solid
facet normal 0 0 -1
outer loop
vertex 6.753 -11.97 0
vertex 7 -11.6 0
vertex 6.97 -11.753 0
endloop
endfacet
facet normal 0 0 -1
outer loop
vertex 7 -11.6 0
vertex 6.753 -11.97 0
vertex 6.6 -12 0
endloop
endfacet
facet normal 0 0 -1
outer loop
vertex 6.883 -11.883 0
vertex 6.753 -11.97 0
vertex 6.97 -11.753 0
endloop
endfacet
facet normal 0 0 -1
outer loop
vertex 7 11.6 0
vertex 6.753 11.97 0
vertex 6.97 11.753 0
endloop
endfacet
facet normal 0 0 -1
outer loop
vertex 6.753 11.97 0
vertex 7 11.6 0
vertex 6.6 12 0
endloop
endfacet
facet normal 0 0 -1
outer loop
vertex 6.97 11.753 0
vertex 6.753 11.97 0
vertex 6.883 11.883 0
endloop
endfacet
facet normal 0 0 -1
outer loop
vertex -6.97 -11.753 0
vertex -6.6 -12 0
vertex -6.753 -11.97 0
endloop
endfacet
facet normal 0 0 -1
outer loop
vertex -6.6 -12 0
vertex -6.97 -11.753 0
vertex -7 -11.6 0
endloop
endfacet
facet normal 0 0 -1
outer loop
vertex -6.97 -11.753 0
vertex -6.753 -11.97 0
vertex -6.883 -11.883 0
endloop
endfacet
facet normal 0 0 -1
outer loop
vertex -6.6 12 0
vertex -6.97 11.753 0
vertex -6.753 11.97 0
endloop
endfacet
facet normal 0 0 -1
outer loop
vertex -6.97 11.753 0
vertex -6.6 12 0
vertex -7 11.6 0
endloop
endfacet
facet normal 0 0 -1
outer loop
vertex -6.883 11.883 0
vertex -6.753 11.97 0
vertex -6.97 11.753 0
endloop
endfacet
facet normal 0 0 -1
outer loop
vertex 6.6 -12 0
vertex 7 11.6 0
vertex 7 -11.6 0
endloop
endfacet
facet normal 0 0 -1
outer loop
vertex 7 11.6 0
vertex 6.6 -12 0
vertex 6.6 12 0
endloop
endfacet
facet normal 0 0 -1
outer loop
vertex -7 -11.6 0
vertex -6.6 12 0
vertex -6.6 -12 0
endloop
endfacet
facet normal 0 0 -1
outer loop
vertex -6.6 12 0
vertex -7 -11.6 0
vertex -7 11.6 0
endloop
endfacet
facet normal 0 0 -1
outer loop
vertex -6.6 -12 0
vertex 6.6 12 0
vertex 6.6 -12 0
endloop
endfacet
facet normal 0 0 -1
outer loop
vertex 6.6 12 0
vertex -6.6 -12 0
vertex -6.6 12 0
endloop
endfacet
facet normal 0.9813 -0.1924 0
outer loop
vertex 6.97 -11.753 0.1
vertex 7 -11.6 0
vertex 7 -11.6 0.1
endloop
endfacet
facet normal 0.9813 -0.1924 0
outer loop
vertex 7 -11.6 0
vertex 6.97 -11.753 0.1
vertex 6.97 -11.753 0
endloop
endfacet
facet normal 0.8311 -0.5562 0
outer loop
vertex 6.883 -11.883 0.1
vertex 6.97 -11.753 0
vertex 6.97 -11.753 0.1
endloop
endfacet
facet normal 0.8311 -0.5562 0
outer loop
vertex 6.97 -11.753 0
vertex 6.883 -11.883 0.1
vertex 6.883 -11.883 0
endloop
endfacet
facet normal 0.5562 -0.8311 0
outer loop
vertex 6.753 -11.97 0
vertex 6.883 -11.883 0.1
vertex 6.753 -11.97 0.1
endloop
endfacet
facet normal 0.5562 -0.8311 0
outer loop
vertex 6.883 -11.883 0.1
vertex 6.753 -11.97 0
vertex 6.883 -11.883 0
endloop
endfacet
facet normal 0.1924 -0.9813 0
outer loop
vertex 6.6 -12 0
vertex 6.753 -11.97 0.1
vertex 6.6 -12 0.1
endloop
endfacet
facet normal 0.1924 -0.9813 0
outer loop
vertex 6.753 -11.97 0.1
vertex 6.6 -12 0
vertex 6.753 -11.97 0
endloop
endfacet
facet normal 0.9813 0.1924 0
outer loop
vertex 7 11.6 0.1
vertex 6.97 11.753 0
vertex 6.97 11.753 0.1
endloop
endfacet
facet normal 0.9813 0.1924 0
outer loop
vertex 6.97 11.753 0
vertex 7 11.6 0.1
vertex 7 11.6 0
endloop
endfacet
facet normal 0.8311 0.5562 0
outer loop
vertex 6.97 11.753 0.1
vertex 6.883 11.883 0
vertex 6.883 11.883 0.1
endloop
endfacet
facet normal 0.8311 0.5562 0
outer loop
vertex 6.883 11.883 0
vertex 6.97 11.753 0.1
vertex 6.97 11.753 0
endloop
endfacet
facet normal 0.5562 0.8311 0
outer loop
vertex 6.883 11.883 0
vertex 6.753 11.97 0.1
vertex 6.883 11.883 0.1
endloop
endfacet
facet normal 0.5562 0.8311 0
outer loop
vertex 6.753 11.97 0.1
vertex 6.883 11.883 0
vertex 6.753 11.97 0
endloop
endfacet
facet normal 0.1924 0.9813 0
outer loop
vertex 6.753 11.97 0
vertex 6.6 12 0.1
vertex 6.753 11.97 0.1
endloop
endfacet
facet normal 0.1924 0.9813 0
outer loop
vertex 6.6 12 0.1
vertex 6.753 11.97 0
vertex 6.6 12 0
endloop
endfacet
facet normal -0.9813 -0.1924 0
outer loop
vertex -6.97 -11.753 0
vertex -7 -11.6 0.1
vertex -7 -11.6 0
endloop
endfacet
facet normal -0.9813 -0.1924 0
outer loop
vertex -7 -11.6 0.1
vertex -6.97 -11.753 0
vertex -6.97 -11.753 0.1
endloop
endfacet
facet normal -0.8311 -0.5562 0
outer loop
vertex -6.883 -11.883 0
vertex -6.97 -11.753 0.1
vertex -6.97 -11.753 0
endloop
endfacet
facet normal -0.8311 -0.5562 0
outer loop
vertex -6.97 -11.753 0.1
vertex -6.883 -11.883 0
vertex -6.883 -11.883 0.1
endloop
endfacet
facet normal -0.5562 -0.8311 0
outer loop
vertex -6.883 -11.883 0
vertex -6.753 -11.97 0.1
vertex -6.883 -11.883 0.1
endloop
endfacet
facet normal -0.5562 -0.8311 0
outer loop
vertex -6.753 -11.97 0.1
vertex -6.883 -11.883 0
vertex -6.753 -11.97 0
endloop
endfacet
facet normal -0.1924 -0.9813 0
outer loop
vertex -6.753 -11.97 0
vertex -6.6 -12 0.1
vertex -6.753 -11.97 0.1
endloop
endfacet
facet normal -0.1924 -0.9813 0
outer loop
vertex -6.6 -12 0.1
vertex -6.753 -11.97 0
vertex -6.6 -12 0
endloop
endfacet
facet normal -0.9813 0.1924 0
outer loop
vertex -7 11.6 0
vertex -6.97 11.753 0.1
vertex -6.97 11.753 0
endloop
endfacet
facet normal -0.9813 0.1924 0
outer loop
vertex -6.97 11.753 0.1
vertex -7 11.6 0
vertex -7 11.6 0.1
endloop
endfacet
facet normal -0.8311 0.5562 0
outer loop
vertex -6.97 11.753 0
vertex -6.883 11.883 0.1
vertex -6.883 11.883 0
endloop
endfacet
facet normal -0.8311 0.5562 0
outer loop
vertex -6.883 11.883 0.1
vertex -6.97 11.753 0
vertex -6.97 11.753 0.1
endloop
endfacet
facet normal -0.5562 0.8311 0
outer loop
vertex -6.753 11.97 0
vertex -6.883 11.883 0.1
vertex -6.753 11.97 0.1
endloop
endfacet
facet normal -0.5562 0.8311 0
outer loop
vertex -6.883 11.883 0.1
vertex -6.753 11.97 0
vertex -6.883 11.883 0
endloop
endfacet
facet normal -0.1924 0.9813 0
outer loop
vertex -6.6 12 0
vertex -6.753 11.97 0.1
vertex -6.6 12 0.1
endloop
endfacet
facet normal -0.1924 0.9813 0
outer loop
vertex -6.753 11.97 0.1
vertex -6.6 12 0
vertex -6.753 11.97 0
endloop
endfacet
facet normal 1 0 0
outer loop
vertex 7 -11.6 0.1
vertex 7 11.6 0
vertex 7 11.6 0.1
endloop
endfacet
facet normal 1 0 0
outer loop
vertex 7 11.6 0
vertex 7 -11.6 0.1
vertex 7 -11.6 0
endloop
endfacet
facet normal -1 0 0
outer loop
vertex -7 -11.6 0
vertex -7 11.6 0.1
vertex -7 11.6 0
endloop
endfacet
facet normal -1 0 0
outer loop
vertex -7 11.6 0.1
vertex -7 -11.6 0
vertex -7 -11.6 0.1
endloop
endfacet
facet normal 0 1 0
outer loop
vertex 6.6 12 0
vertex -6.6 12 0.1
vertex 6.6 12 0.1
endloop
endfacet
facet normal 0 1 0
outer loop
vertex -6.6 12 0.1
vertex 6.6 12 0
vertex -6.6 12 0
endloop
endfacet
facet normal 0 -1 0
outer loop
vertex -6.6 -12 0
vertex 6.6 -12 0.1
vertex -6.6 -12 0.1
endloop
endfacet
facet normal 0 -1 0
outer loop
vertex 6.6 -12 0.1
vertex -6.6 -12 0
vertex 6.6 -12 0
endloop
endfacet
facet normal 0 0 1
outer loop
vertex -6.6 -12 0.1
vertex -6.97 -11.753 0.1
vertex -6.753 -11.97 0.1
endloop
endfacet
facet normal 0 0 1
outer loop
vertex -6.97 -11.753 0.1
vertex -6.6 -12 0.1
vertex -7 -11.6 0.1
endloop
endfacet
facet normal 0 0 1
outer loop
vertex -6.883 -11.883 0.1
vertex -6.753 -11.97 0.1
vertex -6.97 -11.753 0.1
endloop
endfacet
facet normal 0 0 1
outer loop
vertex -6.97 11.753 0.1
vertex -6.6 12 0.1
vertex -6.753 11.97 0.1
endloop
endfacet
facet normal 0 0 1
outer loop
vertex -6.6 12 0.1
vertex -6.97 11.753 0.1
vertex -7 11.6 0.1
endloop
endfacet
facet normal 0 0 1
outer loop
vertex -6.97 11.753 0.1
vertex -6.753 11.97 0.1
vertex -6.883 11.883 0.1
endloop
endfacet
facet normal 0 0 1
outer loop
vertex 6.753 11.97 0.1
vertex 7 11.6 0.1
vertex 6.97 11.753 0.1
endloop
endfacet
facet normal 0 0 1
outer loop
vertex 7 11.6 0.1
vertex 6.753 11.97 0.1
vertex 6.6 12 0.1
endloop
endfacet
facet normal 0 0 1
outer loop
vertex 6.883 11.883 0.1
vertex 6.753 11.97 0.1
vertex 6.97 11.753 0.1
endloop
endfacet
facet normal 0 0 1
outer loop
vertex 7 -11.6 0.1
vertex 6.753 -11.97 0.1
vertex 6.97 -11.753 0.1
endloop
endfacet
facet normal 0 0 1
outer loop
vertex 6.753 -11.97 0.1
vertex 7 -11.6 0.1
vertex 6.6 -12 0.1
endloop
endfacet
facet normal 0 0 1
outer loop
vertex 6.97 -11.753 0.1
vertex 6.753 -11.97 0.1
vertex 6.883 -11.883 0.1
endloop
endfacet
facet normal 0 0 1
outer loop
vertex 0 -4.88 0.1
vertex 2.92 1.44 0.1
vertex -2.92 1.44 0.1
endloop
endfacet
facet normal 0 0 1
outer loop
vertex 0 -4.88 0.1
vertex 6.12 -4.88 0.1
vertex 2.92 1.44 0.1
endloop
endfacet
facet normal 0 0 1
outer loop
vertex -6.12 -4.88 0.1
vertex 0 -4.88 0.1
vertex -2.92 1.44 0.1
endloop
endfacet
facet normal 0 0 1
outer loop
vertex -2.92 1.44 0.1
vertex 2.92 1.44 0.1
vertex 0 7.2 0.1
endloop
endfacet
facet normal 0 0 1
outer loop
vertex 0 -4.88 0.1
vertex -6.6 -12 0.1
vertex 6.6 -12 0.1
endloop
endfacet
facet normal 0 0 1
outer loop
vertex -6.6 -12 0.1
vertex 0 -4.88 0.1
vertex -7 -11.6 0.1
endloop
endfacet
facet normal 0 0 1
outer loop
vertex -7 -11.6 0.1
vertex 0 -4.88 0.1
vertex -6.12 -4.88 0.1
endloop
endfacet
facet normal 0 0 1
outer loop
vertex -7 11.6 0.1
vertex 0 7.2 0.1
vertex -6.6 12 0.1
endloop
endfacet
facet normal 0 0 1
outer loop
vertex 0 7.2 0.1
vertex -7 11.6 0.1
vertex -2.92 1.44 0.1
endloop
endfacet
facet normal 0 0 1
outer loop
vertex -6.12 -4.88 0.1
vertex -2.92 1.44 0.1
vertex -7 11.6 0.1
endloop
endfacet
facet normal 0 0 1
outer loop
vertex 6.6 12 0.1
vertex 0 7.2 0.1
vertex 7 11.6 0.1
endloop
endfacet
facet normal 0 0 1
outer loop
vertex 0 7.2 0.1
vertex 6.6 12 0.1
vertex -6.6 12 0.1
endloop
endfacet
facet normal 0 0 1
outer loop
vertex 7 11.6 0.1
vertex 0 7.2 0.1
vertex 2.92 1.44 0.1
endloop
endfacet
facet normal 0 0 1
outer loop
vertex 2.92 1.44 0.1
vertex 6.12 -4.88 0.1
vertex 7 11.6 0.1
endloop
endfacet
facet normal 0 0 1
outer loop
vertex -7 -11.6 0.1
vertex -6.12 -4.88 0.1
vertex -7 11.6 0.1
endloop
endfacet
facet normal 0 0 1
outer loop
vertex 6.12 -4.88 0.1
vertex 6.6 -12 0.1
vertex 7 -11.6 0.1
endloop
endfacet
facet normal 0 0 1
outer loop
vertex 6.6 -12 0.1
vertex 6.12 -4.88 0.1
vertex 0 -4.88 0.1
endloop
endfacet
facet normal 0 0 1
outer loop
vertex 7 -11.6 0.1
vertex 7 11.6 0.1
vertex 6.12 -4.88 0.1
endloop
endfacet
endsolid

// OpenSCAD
// file: ../p/1-4cyli.scad
use <../lib.scad>
function ldraw_lib__1_4cyli() = [
// 0 Cylinder 0.25
// 0 Name: 1-4cyli.dat
// 0 Author: James Jessiman
// 0 !LDRAW_ORG Primitive UPDATE 2012-01
// 0 !LICENSE Licensed under CC BY 4.0 : see CAreadme.txt
// 
// 0 BFC CERTIFY CCW
  [0,"BFC","CERTIFY"],
  [0,"BFC","CCW"],
// 
// 0 !HISTORY 2002-03-23 [sbliss] Added BFC statement.
// 0 !HISTORY 2002-04-25 [PTadmin] Official Update 2002-02
// 0 !HISTORY 2007-06-22 [PTadmin] Header formatted for Contributor Agreement
// 0 !HISTORY 2008-07-01 [PTadmin] Official Update 2008-01
// 0 !HISTORY 2012-02-16 [Philo] Changed to CCW
// 0 !HISTORY 2012-03-30 [PTadmin] Official Update 2012-01
// 
// 
// 4 16 1 1 0 0.9239 1 0.3827 0.9239 0 0.3827 1 0 0
  [4,16,1,1,0,0.9239,1,0.3827,0.9239,0,0.3827,1,0,0],
// 5 24 1 0 0 1 1 0 0.9239 0 0.3827 1 0 -1
  [5,24,1,0,0,1,1,0,0.9239,0,0.3827,1,0,-1],
// 4 16 0.9239 1 0.3827 0.7071 1 0.7071 0.7071 0 0.7071 0.9239 0 0.3827
  [4,16,0.9239,1,0.3827,0.7071,1,0.7071,0.7071,0,0.7071,0.9239,0,0.3827],
// 5 24 0.9239 0 0.3827 0.9239 1 0.3827 0.7071 0 0.7071 1 0 0
  [5,24,0.9239,0,0.3827,0.9239,1,0.3827,0.7071,0,0.7071,1,0,0],
// 4 16 0.7071 1 0.7071 0.3827 1 0.9239 0.3827 0 0.9239 0.7071 0 0.7071
  [4,16,0.7071,1,0.7071,0.3827,1,0.9239,0.3827,0,0.9239,0.7071,0,0.7071],
// 5 24 0.7071 0 0.7071 0.7071 1 0.7071 0.3827 0 0.9239 0.9239 0 0.3827
  [5,24,0.7071,0,0.7071,0.7071,1,0.7071,0.3827,0,0.9239,0.9239,0,0.3827],
// 4 16 0.3827 1 0.9239 0 1 1 0 0 1 0.3827 0 0.9239
  [4,16,0.3827,1,0.9239,0,1,1,0,0,1,0.3827,0,0.9239],
// 5 24 0.3827 0 0.9239 0.3827 1 0.9239 0 0 1 0.7071 0 0.7071
  [5,24,0.3827,0,0.9239,0.3827,1,0.9239,0,0,1,0.7071,0,0.7071],
// 5 24 0 0 1 0 1 1 0.3827 0 0.9239 -1 0 1
  [5,24,0,0,1,0,1,1,0.3827,0,0.9239,-1,0,1],
];
module ldraw_lib__1_4cyli(step=0, col=false, unit=2/5, alt=false, line=0.2, solid=!$preview)
    makepoly(ldraw_lib__1_4cyli(), step=step, col=col, unit=unit, alt=alt, line=line, solid=solid);
ldraw_lib__1_4cyli(line=0.2);
// file: ../p/1-4chrd.scad
use <../lib.scad>
function ldraw_lib__1_4chrd() = [
// 0 Chord 0.25
// 0 Name: 1-4chrd.dat
// 0 Author: Max Martin Richter [MMR1988]
// 0 !LDRAW_ORG Primitive UPDATE 2023-05
// 0 !LICENSE Licensed under CC BY 4.0 : see CAreadme.txt
// 
// 0 BFC CERTIFY CCW
  [0,"BFC","CERTIFY"],
  [0,"BFC","CCW"],
// 
// 0 !HISTORY 2004-04-22 [PTadmin] Official Update 2004-02
// 0 !HISTORY 2007-10-09 [PTadmin] Header formatted for Contributor Agreement
// 0 !HISTORY 2008-07-01 [PTadmin] Official Update 2008-01
// 0 !HISTORY 2012-08-02 [MMR1988] Re-creation with PrimGen2 and Rectifier
// 0 !HISTORY 2012-08-09 [PTadmin] Official Update 2012-02
// 0 !HISTORY 2023-10-27 [OrionP] Change author to MMR1988 from hafhead
// 0 !HISTORY 2023-10-31 [OrionP] Official Update 2023-05
// 
// 4 16 0.9239 0 0.3827 0.3827 0 0.9239 0 0 1 1 0 0
  [4,16,0.9239,0,0.3827,0.3827,0,0.9239,0,0,1,1,0,0],
// 3 16 0.7071 0 0.7071 0.3827 0 0.9239 0.9239 0 0.3827
  [3,16,0.7071,0,0.7071,0.3827,0,0.9239,0.9239,0,0.3827],
];
module ldraw_lib__1_4chrd(step=0, col=false, unit=2/5, alt=false, line=0.2, solid=!$preview)
    makepoly(ldraw_lib__1_4chrd(), step=step, col=col, unit=unit, alt=alt, line=line, solid=solid);
ldraw_lib__1_4chrd(line=0.2);
// main file
use <../lib.scad>
use <../p/1-4chrd.scad>
use <../p/1-4cyli.scad>
function ldraw_lib__6429457e() = [
// 0 Sticker  1.8 x  3.0 with Blacktron I Logo
// 0 Name: 6429457e.dat
// 0 Author: Gabriel Läufer [Dr.Bricktacular]
// 0 !LDRAW_ORG Part UPDATE 2025-02
// 0 !LICENSE Licensed under CC BY 4.0 : see CAreadme.txt
// 
// 0 BFC CERTIFY CCW
  [0,"BFC","CERTIFY"],
  [0,"BFC","CCW"],
// 
// 0 !KEYWORDS Blacktron Cruiser, Bricklink 40580stk01, Brickowl 402277
// 0 !KEYWORDS Rebrickable 10102362, Set 40580
// 
// 0 !HISTORY 2025-02-27 [OrionP] Official Update 2025-02
// 
// 0 // Sticker-Bottom
// 1 16 16.5 0 -29.0 1 0 0 0 -1 0 0 0 -1 1-4chrd.dat
  [1,16,16.5,0,-29.0,1,0,0,0,-1,0,0,0,-1, ldraw_lib__1_4chrd()],
// 1 16 16.5 0 29.0 1 0 0 0 -1 0 0 0 1 1-4chrd.dat
  [1,16,16.5,0,29.0,1,0,0,0,-1,0,0,0,1, ldraw_lib__1_4chrd()],
// 1 16 -16.5 0 -29.0 -1 0 0 0 -1 0 0 0 -1 1-4chrd.dat
  [1,16,-16.5,0,-29.0,-1,0,0,0,-1,0,0,0,-1, ldraw_lib__1_4chrd()],
// 1 16 -16.5 0 29.0 -1 0 0 0 -1 0 0 0 1 1-4chrd.dat
  [1,16,-16.5,0,29.0,-1,0,0,0,-1,0,0,0,1, ldraw_lib__1_4chrd()],
// 4 16 17.5 0 29.0 17.5 0 -29.0 16.5 0 -30.0 16.5 0 30.0
  [4,16,17.5,0,29.0,17.5,0,-29.0,16.5,0,-30.0,16.5,0,30.0],
// 4 16 -17.5 0 29.0 -16.5 0 30.0 -16.5 0 -30.0 -17.5 0 -29.0
  [4,16,-17.5,0,29.0,-16.5,0,30.0,-16.5,0,-30.0,-17.5,0,-29.0],
// 4 16 16.5 0 30.0 16.5 0 -30.0 -16.5 0 -30.0 -16.5 0 30.0
  [4,16,16.5,0,30.0,16.5,0,-30.0,-16.5,0,-30.0,-16.5,0,30.0],
// 
// 0 // Sticker-Side
// 1 16 16.5 -0.25 -29.0 1 0 0 0 0.25 0 0 0 -1 1-4cyli.dat
  [1,16,16.5,-0.25,-29.0,1,0,0,0,0.25,0,0,0,-1, ldraw_lib__1_4cyli()],
// 1 16 16.5 -0.25 29.0 1 0 0 0 0.25 0 0 0 1 1-4cyli.dat
  [1,16,16.5,-0.25,29.0,1,0,0,0,0.25,0,0,0,1, ldraw_lib__1_4cyli()],
// 1 16 -16.5 -0.25 -29.0 -1 0 0 0 0.25 0 0 0 -1 1-4cyli.dat
  [1,16,-16.5,-0.25,-29.0,-1,0,0,0,0.25,0,0,0,-1, ldraw_lib__1_4cyli()],
// 1 16 -16.5 -0.25 29.0 -1 0 0 0 0.25 0 0 0 1 1-4cyli.dat
  [1,16,-16.5,-0.25,29.0,-1,0,0,0,0.25,0,0,0,1, ldraw_lib__1_4cyli()],
// 4 16 17.5 0 29.0 17.5 -0.25 29.0 17.5 -0.25 -29.0 17.5 0 -29.0
  [4,16,17.5,0,29.0,17.5,-0.25,29.0,17.5,-0.25,-29.0,17.5,0,-29.0],
// 4 16 -17.5 0 29.0 -17.5 0 -29.0 -17.5 -0.25 -29.0 -17.5 -0.25 29.0
  [4,16,-17.5,0,29.0,-17.5,0,-29.0,-17.5,-0.25,-29.0,-17.5,-0.25,29.0],
// 4 16 -16.5 0 30.0 -16.5 -0.25 30.0 16.5 -0.25 30.0 16.5 0 30.0
  [4,16,-16.5,0,30.0,-16.5,-0.25,30.0,16.5,-0.25,30.0,16.5,0,30.0],
// 4 16 -16.5 0 -30.0 16.5 0 -30.0 16.5 -0.25 -30.0 -16.5 -0.25 -30.0
  [4,16,-16.5,0,-30.0,16.5,0,-30.0,16.5,-0.25,-30.0,-16.5,-0.25,-30.0],
// 
// 0 // Sticker-Front
// 1 0 -16.5 -.25 -29 -1 0 0 0 1 0 0 0 -1 1-4chrd.dat
  [1,0,-16.5,-.25,-29,-1,0,0,0,1,0,0,0,-1, ldraw_lib__1_4chrd()],
// 1 0 -16.5 -.25 29 -1 0 0 0 1 0 0 0 1 1-4chrd.dat
  [1,0,-16.5,-.25,29,-1,0,0,0,1,0,0,0,1, ldraw_lib__1_4chrd()],
// 1 0 16.5 -.25 29 1 0 0 0 1 0 0 0 1 1-4chrd.dat
  [1,0,16.5,-.25,29,1,0,0,0,1,0,0,0,1, ldraw_lib__1_4chrd()],
// 1 0 16.5 -.25 -29 1 0 0 0 1 0 0 0 -1 1-4chrd.dat
  [1,0,16.5,-.25,-29,1,0,0,0,1,0,0,0,-1, ldraw_lib__1_4chrd()],
// 3 0 0 -.25 -12.2 7.3 -.25 3.6 -7.3 -.25 3.6
  [3,0,0,-.25,-12.2,7.3,-.25,3.6,-7.3,-.25,3.6],
// 3 14 0 -.25 -12.2 15.3 -.25 -12.2 7.3 -.25 3.6
  [3,14,0,-.25,-12.2,15.3,-.25,-12.2,7.3,-.25,3.6],
// 3 14 -15.3 -.25 -12.2 0 -.25 -12.2 -7.3 -.25 3.6
  [3,14,-15.3,-.25,-12.2,0,-.25,-12.2,-7.3,-.25,3.6],
// 3 14 -7.3 -.25 3.6 7.3 -.25 3.6 0 -.25 18
  [3,14,-7.3,-.25,3.6,7.3,-.25,3.6,0,-.25,18],
// 4 0 -16.5 -.25 -30 16.5 -.25 -30 0 -.25 -12.2 -17.5 -.25 -29
  [4,0,-16.5,-.25,-30,16.5,-.25,-30,0,-.25,-12.2,-17.5,-.25,-29],
// 3 0 -17.5 -.25 -29 0 -.25 -12.2 -15.3 -.25 -12.2
  [3,0,-17.5,-.25,-29,0,-.25,-12.2,-15.3,-.25,-12.2],
// 4 0 0 -.25 18 -16.5 -.25 30 -17.5 -.25 29 -7.3 -.25 3.6
  [4,0,0,-.25,18,-16.5,-.25,30,-17.5,-.25,29,-7.3,-.25,3.6],
// 3 0 -15.3 -.25 -12.2 -7.3 -.25 3.6 -17.5 -.25 29
  [3,0,-15.3,-.25,-12.2,-7.3,-.25,3.6,-17.5,-.25,29],
// 4 0 16.5 -.25 30 -16.5 -.25 30 0 -.25 18 17.5 -.25 29
  [4,0,16.5,-.25,30,-16.5,-.25,30,0,-.25,18,17.5,-.25,29],
// 3 0 17.5 -.25 29 0 -.25 18 7.3 -.25 3.6
  [3,0,17.5,-.25,29,0,-.25,18,7.3,-.25,3.6],
// 3 0 7.3 -.25 3.6 15.3 -.25 -12.2 17.5 -.25 29
  [3,0,7.3,-.25,3.6,15.3,-.25,-12.2,17.5,-.25,29],
// 3 0 -17.5 -.25 -29 -15.3 -.25 -12.2 -17.5 -.25 29
  [3,0,-17.5,-.25,-29,-15.3,-.25,-12.2,-17.5,-.25,29],
// 4 0 17.5 -.25 -29 15.3 -.25 -12.2 0 -.25 -12.2 16.5 -.25 -30
  [4,0,17.5,-.25,-29,15.3,-.25,-12.2,0,-.25,-12.2,16.5,-.25,-30],
// 3 0 17.5 -.25 -29 17.5 -.25 29 15.3 -.25 -12.2
  [3,0,17.5,-.25,-29,17.5,-.25,29,15.3,-.25,-12.2],
// 
];
module ldraw_lib__6429457e(step=0, col=false, unit=2/5, alt=false, line=0.2, solid=!$preview)
    makepoly(ldraw_lib__6429457e(), step=step, col=col, unit=unit, alt=alt, line=line, solid=solid);
ldraw_lib__6429457e(line=0.2);
